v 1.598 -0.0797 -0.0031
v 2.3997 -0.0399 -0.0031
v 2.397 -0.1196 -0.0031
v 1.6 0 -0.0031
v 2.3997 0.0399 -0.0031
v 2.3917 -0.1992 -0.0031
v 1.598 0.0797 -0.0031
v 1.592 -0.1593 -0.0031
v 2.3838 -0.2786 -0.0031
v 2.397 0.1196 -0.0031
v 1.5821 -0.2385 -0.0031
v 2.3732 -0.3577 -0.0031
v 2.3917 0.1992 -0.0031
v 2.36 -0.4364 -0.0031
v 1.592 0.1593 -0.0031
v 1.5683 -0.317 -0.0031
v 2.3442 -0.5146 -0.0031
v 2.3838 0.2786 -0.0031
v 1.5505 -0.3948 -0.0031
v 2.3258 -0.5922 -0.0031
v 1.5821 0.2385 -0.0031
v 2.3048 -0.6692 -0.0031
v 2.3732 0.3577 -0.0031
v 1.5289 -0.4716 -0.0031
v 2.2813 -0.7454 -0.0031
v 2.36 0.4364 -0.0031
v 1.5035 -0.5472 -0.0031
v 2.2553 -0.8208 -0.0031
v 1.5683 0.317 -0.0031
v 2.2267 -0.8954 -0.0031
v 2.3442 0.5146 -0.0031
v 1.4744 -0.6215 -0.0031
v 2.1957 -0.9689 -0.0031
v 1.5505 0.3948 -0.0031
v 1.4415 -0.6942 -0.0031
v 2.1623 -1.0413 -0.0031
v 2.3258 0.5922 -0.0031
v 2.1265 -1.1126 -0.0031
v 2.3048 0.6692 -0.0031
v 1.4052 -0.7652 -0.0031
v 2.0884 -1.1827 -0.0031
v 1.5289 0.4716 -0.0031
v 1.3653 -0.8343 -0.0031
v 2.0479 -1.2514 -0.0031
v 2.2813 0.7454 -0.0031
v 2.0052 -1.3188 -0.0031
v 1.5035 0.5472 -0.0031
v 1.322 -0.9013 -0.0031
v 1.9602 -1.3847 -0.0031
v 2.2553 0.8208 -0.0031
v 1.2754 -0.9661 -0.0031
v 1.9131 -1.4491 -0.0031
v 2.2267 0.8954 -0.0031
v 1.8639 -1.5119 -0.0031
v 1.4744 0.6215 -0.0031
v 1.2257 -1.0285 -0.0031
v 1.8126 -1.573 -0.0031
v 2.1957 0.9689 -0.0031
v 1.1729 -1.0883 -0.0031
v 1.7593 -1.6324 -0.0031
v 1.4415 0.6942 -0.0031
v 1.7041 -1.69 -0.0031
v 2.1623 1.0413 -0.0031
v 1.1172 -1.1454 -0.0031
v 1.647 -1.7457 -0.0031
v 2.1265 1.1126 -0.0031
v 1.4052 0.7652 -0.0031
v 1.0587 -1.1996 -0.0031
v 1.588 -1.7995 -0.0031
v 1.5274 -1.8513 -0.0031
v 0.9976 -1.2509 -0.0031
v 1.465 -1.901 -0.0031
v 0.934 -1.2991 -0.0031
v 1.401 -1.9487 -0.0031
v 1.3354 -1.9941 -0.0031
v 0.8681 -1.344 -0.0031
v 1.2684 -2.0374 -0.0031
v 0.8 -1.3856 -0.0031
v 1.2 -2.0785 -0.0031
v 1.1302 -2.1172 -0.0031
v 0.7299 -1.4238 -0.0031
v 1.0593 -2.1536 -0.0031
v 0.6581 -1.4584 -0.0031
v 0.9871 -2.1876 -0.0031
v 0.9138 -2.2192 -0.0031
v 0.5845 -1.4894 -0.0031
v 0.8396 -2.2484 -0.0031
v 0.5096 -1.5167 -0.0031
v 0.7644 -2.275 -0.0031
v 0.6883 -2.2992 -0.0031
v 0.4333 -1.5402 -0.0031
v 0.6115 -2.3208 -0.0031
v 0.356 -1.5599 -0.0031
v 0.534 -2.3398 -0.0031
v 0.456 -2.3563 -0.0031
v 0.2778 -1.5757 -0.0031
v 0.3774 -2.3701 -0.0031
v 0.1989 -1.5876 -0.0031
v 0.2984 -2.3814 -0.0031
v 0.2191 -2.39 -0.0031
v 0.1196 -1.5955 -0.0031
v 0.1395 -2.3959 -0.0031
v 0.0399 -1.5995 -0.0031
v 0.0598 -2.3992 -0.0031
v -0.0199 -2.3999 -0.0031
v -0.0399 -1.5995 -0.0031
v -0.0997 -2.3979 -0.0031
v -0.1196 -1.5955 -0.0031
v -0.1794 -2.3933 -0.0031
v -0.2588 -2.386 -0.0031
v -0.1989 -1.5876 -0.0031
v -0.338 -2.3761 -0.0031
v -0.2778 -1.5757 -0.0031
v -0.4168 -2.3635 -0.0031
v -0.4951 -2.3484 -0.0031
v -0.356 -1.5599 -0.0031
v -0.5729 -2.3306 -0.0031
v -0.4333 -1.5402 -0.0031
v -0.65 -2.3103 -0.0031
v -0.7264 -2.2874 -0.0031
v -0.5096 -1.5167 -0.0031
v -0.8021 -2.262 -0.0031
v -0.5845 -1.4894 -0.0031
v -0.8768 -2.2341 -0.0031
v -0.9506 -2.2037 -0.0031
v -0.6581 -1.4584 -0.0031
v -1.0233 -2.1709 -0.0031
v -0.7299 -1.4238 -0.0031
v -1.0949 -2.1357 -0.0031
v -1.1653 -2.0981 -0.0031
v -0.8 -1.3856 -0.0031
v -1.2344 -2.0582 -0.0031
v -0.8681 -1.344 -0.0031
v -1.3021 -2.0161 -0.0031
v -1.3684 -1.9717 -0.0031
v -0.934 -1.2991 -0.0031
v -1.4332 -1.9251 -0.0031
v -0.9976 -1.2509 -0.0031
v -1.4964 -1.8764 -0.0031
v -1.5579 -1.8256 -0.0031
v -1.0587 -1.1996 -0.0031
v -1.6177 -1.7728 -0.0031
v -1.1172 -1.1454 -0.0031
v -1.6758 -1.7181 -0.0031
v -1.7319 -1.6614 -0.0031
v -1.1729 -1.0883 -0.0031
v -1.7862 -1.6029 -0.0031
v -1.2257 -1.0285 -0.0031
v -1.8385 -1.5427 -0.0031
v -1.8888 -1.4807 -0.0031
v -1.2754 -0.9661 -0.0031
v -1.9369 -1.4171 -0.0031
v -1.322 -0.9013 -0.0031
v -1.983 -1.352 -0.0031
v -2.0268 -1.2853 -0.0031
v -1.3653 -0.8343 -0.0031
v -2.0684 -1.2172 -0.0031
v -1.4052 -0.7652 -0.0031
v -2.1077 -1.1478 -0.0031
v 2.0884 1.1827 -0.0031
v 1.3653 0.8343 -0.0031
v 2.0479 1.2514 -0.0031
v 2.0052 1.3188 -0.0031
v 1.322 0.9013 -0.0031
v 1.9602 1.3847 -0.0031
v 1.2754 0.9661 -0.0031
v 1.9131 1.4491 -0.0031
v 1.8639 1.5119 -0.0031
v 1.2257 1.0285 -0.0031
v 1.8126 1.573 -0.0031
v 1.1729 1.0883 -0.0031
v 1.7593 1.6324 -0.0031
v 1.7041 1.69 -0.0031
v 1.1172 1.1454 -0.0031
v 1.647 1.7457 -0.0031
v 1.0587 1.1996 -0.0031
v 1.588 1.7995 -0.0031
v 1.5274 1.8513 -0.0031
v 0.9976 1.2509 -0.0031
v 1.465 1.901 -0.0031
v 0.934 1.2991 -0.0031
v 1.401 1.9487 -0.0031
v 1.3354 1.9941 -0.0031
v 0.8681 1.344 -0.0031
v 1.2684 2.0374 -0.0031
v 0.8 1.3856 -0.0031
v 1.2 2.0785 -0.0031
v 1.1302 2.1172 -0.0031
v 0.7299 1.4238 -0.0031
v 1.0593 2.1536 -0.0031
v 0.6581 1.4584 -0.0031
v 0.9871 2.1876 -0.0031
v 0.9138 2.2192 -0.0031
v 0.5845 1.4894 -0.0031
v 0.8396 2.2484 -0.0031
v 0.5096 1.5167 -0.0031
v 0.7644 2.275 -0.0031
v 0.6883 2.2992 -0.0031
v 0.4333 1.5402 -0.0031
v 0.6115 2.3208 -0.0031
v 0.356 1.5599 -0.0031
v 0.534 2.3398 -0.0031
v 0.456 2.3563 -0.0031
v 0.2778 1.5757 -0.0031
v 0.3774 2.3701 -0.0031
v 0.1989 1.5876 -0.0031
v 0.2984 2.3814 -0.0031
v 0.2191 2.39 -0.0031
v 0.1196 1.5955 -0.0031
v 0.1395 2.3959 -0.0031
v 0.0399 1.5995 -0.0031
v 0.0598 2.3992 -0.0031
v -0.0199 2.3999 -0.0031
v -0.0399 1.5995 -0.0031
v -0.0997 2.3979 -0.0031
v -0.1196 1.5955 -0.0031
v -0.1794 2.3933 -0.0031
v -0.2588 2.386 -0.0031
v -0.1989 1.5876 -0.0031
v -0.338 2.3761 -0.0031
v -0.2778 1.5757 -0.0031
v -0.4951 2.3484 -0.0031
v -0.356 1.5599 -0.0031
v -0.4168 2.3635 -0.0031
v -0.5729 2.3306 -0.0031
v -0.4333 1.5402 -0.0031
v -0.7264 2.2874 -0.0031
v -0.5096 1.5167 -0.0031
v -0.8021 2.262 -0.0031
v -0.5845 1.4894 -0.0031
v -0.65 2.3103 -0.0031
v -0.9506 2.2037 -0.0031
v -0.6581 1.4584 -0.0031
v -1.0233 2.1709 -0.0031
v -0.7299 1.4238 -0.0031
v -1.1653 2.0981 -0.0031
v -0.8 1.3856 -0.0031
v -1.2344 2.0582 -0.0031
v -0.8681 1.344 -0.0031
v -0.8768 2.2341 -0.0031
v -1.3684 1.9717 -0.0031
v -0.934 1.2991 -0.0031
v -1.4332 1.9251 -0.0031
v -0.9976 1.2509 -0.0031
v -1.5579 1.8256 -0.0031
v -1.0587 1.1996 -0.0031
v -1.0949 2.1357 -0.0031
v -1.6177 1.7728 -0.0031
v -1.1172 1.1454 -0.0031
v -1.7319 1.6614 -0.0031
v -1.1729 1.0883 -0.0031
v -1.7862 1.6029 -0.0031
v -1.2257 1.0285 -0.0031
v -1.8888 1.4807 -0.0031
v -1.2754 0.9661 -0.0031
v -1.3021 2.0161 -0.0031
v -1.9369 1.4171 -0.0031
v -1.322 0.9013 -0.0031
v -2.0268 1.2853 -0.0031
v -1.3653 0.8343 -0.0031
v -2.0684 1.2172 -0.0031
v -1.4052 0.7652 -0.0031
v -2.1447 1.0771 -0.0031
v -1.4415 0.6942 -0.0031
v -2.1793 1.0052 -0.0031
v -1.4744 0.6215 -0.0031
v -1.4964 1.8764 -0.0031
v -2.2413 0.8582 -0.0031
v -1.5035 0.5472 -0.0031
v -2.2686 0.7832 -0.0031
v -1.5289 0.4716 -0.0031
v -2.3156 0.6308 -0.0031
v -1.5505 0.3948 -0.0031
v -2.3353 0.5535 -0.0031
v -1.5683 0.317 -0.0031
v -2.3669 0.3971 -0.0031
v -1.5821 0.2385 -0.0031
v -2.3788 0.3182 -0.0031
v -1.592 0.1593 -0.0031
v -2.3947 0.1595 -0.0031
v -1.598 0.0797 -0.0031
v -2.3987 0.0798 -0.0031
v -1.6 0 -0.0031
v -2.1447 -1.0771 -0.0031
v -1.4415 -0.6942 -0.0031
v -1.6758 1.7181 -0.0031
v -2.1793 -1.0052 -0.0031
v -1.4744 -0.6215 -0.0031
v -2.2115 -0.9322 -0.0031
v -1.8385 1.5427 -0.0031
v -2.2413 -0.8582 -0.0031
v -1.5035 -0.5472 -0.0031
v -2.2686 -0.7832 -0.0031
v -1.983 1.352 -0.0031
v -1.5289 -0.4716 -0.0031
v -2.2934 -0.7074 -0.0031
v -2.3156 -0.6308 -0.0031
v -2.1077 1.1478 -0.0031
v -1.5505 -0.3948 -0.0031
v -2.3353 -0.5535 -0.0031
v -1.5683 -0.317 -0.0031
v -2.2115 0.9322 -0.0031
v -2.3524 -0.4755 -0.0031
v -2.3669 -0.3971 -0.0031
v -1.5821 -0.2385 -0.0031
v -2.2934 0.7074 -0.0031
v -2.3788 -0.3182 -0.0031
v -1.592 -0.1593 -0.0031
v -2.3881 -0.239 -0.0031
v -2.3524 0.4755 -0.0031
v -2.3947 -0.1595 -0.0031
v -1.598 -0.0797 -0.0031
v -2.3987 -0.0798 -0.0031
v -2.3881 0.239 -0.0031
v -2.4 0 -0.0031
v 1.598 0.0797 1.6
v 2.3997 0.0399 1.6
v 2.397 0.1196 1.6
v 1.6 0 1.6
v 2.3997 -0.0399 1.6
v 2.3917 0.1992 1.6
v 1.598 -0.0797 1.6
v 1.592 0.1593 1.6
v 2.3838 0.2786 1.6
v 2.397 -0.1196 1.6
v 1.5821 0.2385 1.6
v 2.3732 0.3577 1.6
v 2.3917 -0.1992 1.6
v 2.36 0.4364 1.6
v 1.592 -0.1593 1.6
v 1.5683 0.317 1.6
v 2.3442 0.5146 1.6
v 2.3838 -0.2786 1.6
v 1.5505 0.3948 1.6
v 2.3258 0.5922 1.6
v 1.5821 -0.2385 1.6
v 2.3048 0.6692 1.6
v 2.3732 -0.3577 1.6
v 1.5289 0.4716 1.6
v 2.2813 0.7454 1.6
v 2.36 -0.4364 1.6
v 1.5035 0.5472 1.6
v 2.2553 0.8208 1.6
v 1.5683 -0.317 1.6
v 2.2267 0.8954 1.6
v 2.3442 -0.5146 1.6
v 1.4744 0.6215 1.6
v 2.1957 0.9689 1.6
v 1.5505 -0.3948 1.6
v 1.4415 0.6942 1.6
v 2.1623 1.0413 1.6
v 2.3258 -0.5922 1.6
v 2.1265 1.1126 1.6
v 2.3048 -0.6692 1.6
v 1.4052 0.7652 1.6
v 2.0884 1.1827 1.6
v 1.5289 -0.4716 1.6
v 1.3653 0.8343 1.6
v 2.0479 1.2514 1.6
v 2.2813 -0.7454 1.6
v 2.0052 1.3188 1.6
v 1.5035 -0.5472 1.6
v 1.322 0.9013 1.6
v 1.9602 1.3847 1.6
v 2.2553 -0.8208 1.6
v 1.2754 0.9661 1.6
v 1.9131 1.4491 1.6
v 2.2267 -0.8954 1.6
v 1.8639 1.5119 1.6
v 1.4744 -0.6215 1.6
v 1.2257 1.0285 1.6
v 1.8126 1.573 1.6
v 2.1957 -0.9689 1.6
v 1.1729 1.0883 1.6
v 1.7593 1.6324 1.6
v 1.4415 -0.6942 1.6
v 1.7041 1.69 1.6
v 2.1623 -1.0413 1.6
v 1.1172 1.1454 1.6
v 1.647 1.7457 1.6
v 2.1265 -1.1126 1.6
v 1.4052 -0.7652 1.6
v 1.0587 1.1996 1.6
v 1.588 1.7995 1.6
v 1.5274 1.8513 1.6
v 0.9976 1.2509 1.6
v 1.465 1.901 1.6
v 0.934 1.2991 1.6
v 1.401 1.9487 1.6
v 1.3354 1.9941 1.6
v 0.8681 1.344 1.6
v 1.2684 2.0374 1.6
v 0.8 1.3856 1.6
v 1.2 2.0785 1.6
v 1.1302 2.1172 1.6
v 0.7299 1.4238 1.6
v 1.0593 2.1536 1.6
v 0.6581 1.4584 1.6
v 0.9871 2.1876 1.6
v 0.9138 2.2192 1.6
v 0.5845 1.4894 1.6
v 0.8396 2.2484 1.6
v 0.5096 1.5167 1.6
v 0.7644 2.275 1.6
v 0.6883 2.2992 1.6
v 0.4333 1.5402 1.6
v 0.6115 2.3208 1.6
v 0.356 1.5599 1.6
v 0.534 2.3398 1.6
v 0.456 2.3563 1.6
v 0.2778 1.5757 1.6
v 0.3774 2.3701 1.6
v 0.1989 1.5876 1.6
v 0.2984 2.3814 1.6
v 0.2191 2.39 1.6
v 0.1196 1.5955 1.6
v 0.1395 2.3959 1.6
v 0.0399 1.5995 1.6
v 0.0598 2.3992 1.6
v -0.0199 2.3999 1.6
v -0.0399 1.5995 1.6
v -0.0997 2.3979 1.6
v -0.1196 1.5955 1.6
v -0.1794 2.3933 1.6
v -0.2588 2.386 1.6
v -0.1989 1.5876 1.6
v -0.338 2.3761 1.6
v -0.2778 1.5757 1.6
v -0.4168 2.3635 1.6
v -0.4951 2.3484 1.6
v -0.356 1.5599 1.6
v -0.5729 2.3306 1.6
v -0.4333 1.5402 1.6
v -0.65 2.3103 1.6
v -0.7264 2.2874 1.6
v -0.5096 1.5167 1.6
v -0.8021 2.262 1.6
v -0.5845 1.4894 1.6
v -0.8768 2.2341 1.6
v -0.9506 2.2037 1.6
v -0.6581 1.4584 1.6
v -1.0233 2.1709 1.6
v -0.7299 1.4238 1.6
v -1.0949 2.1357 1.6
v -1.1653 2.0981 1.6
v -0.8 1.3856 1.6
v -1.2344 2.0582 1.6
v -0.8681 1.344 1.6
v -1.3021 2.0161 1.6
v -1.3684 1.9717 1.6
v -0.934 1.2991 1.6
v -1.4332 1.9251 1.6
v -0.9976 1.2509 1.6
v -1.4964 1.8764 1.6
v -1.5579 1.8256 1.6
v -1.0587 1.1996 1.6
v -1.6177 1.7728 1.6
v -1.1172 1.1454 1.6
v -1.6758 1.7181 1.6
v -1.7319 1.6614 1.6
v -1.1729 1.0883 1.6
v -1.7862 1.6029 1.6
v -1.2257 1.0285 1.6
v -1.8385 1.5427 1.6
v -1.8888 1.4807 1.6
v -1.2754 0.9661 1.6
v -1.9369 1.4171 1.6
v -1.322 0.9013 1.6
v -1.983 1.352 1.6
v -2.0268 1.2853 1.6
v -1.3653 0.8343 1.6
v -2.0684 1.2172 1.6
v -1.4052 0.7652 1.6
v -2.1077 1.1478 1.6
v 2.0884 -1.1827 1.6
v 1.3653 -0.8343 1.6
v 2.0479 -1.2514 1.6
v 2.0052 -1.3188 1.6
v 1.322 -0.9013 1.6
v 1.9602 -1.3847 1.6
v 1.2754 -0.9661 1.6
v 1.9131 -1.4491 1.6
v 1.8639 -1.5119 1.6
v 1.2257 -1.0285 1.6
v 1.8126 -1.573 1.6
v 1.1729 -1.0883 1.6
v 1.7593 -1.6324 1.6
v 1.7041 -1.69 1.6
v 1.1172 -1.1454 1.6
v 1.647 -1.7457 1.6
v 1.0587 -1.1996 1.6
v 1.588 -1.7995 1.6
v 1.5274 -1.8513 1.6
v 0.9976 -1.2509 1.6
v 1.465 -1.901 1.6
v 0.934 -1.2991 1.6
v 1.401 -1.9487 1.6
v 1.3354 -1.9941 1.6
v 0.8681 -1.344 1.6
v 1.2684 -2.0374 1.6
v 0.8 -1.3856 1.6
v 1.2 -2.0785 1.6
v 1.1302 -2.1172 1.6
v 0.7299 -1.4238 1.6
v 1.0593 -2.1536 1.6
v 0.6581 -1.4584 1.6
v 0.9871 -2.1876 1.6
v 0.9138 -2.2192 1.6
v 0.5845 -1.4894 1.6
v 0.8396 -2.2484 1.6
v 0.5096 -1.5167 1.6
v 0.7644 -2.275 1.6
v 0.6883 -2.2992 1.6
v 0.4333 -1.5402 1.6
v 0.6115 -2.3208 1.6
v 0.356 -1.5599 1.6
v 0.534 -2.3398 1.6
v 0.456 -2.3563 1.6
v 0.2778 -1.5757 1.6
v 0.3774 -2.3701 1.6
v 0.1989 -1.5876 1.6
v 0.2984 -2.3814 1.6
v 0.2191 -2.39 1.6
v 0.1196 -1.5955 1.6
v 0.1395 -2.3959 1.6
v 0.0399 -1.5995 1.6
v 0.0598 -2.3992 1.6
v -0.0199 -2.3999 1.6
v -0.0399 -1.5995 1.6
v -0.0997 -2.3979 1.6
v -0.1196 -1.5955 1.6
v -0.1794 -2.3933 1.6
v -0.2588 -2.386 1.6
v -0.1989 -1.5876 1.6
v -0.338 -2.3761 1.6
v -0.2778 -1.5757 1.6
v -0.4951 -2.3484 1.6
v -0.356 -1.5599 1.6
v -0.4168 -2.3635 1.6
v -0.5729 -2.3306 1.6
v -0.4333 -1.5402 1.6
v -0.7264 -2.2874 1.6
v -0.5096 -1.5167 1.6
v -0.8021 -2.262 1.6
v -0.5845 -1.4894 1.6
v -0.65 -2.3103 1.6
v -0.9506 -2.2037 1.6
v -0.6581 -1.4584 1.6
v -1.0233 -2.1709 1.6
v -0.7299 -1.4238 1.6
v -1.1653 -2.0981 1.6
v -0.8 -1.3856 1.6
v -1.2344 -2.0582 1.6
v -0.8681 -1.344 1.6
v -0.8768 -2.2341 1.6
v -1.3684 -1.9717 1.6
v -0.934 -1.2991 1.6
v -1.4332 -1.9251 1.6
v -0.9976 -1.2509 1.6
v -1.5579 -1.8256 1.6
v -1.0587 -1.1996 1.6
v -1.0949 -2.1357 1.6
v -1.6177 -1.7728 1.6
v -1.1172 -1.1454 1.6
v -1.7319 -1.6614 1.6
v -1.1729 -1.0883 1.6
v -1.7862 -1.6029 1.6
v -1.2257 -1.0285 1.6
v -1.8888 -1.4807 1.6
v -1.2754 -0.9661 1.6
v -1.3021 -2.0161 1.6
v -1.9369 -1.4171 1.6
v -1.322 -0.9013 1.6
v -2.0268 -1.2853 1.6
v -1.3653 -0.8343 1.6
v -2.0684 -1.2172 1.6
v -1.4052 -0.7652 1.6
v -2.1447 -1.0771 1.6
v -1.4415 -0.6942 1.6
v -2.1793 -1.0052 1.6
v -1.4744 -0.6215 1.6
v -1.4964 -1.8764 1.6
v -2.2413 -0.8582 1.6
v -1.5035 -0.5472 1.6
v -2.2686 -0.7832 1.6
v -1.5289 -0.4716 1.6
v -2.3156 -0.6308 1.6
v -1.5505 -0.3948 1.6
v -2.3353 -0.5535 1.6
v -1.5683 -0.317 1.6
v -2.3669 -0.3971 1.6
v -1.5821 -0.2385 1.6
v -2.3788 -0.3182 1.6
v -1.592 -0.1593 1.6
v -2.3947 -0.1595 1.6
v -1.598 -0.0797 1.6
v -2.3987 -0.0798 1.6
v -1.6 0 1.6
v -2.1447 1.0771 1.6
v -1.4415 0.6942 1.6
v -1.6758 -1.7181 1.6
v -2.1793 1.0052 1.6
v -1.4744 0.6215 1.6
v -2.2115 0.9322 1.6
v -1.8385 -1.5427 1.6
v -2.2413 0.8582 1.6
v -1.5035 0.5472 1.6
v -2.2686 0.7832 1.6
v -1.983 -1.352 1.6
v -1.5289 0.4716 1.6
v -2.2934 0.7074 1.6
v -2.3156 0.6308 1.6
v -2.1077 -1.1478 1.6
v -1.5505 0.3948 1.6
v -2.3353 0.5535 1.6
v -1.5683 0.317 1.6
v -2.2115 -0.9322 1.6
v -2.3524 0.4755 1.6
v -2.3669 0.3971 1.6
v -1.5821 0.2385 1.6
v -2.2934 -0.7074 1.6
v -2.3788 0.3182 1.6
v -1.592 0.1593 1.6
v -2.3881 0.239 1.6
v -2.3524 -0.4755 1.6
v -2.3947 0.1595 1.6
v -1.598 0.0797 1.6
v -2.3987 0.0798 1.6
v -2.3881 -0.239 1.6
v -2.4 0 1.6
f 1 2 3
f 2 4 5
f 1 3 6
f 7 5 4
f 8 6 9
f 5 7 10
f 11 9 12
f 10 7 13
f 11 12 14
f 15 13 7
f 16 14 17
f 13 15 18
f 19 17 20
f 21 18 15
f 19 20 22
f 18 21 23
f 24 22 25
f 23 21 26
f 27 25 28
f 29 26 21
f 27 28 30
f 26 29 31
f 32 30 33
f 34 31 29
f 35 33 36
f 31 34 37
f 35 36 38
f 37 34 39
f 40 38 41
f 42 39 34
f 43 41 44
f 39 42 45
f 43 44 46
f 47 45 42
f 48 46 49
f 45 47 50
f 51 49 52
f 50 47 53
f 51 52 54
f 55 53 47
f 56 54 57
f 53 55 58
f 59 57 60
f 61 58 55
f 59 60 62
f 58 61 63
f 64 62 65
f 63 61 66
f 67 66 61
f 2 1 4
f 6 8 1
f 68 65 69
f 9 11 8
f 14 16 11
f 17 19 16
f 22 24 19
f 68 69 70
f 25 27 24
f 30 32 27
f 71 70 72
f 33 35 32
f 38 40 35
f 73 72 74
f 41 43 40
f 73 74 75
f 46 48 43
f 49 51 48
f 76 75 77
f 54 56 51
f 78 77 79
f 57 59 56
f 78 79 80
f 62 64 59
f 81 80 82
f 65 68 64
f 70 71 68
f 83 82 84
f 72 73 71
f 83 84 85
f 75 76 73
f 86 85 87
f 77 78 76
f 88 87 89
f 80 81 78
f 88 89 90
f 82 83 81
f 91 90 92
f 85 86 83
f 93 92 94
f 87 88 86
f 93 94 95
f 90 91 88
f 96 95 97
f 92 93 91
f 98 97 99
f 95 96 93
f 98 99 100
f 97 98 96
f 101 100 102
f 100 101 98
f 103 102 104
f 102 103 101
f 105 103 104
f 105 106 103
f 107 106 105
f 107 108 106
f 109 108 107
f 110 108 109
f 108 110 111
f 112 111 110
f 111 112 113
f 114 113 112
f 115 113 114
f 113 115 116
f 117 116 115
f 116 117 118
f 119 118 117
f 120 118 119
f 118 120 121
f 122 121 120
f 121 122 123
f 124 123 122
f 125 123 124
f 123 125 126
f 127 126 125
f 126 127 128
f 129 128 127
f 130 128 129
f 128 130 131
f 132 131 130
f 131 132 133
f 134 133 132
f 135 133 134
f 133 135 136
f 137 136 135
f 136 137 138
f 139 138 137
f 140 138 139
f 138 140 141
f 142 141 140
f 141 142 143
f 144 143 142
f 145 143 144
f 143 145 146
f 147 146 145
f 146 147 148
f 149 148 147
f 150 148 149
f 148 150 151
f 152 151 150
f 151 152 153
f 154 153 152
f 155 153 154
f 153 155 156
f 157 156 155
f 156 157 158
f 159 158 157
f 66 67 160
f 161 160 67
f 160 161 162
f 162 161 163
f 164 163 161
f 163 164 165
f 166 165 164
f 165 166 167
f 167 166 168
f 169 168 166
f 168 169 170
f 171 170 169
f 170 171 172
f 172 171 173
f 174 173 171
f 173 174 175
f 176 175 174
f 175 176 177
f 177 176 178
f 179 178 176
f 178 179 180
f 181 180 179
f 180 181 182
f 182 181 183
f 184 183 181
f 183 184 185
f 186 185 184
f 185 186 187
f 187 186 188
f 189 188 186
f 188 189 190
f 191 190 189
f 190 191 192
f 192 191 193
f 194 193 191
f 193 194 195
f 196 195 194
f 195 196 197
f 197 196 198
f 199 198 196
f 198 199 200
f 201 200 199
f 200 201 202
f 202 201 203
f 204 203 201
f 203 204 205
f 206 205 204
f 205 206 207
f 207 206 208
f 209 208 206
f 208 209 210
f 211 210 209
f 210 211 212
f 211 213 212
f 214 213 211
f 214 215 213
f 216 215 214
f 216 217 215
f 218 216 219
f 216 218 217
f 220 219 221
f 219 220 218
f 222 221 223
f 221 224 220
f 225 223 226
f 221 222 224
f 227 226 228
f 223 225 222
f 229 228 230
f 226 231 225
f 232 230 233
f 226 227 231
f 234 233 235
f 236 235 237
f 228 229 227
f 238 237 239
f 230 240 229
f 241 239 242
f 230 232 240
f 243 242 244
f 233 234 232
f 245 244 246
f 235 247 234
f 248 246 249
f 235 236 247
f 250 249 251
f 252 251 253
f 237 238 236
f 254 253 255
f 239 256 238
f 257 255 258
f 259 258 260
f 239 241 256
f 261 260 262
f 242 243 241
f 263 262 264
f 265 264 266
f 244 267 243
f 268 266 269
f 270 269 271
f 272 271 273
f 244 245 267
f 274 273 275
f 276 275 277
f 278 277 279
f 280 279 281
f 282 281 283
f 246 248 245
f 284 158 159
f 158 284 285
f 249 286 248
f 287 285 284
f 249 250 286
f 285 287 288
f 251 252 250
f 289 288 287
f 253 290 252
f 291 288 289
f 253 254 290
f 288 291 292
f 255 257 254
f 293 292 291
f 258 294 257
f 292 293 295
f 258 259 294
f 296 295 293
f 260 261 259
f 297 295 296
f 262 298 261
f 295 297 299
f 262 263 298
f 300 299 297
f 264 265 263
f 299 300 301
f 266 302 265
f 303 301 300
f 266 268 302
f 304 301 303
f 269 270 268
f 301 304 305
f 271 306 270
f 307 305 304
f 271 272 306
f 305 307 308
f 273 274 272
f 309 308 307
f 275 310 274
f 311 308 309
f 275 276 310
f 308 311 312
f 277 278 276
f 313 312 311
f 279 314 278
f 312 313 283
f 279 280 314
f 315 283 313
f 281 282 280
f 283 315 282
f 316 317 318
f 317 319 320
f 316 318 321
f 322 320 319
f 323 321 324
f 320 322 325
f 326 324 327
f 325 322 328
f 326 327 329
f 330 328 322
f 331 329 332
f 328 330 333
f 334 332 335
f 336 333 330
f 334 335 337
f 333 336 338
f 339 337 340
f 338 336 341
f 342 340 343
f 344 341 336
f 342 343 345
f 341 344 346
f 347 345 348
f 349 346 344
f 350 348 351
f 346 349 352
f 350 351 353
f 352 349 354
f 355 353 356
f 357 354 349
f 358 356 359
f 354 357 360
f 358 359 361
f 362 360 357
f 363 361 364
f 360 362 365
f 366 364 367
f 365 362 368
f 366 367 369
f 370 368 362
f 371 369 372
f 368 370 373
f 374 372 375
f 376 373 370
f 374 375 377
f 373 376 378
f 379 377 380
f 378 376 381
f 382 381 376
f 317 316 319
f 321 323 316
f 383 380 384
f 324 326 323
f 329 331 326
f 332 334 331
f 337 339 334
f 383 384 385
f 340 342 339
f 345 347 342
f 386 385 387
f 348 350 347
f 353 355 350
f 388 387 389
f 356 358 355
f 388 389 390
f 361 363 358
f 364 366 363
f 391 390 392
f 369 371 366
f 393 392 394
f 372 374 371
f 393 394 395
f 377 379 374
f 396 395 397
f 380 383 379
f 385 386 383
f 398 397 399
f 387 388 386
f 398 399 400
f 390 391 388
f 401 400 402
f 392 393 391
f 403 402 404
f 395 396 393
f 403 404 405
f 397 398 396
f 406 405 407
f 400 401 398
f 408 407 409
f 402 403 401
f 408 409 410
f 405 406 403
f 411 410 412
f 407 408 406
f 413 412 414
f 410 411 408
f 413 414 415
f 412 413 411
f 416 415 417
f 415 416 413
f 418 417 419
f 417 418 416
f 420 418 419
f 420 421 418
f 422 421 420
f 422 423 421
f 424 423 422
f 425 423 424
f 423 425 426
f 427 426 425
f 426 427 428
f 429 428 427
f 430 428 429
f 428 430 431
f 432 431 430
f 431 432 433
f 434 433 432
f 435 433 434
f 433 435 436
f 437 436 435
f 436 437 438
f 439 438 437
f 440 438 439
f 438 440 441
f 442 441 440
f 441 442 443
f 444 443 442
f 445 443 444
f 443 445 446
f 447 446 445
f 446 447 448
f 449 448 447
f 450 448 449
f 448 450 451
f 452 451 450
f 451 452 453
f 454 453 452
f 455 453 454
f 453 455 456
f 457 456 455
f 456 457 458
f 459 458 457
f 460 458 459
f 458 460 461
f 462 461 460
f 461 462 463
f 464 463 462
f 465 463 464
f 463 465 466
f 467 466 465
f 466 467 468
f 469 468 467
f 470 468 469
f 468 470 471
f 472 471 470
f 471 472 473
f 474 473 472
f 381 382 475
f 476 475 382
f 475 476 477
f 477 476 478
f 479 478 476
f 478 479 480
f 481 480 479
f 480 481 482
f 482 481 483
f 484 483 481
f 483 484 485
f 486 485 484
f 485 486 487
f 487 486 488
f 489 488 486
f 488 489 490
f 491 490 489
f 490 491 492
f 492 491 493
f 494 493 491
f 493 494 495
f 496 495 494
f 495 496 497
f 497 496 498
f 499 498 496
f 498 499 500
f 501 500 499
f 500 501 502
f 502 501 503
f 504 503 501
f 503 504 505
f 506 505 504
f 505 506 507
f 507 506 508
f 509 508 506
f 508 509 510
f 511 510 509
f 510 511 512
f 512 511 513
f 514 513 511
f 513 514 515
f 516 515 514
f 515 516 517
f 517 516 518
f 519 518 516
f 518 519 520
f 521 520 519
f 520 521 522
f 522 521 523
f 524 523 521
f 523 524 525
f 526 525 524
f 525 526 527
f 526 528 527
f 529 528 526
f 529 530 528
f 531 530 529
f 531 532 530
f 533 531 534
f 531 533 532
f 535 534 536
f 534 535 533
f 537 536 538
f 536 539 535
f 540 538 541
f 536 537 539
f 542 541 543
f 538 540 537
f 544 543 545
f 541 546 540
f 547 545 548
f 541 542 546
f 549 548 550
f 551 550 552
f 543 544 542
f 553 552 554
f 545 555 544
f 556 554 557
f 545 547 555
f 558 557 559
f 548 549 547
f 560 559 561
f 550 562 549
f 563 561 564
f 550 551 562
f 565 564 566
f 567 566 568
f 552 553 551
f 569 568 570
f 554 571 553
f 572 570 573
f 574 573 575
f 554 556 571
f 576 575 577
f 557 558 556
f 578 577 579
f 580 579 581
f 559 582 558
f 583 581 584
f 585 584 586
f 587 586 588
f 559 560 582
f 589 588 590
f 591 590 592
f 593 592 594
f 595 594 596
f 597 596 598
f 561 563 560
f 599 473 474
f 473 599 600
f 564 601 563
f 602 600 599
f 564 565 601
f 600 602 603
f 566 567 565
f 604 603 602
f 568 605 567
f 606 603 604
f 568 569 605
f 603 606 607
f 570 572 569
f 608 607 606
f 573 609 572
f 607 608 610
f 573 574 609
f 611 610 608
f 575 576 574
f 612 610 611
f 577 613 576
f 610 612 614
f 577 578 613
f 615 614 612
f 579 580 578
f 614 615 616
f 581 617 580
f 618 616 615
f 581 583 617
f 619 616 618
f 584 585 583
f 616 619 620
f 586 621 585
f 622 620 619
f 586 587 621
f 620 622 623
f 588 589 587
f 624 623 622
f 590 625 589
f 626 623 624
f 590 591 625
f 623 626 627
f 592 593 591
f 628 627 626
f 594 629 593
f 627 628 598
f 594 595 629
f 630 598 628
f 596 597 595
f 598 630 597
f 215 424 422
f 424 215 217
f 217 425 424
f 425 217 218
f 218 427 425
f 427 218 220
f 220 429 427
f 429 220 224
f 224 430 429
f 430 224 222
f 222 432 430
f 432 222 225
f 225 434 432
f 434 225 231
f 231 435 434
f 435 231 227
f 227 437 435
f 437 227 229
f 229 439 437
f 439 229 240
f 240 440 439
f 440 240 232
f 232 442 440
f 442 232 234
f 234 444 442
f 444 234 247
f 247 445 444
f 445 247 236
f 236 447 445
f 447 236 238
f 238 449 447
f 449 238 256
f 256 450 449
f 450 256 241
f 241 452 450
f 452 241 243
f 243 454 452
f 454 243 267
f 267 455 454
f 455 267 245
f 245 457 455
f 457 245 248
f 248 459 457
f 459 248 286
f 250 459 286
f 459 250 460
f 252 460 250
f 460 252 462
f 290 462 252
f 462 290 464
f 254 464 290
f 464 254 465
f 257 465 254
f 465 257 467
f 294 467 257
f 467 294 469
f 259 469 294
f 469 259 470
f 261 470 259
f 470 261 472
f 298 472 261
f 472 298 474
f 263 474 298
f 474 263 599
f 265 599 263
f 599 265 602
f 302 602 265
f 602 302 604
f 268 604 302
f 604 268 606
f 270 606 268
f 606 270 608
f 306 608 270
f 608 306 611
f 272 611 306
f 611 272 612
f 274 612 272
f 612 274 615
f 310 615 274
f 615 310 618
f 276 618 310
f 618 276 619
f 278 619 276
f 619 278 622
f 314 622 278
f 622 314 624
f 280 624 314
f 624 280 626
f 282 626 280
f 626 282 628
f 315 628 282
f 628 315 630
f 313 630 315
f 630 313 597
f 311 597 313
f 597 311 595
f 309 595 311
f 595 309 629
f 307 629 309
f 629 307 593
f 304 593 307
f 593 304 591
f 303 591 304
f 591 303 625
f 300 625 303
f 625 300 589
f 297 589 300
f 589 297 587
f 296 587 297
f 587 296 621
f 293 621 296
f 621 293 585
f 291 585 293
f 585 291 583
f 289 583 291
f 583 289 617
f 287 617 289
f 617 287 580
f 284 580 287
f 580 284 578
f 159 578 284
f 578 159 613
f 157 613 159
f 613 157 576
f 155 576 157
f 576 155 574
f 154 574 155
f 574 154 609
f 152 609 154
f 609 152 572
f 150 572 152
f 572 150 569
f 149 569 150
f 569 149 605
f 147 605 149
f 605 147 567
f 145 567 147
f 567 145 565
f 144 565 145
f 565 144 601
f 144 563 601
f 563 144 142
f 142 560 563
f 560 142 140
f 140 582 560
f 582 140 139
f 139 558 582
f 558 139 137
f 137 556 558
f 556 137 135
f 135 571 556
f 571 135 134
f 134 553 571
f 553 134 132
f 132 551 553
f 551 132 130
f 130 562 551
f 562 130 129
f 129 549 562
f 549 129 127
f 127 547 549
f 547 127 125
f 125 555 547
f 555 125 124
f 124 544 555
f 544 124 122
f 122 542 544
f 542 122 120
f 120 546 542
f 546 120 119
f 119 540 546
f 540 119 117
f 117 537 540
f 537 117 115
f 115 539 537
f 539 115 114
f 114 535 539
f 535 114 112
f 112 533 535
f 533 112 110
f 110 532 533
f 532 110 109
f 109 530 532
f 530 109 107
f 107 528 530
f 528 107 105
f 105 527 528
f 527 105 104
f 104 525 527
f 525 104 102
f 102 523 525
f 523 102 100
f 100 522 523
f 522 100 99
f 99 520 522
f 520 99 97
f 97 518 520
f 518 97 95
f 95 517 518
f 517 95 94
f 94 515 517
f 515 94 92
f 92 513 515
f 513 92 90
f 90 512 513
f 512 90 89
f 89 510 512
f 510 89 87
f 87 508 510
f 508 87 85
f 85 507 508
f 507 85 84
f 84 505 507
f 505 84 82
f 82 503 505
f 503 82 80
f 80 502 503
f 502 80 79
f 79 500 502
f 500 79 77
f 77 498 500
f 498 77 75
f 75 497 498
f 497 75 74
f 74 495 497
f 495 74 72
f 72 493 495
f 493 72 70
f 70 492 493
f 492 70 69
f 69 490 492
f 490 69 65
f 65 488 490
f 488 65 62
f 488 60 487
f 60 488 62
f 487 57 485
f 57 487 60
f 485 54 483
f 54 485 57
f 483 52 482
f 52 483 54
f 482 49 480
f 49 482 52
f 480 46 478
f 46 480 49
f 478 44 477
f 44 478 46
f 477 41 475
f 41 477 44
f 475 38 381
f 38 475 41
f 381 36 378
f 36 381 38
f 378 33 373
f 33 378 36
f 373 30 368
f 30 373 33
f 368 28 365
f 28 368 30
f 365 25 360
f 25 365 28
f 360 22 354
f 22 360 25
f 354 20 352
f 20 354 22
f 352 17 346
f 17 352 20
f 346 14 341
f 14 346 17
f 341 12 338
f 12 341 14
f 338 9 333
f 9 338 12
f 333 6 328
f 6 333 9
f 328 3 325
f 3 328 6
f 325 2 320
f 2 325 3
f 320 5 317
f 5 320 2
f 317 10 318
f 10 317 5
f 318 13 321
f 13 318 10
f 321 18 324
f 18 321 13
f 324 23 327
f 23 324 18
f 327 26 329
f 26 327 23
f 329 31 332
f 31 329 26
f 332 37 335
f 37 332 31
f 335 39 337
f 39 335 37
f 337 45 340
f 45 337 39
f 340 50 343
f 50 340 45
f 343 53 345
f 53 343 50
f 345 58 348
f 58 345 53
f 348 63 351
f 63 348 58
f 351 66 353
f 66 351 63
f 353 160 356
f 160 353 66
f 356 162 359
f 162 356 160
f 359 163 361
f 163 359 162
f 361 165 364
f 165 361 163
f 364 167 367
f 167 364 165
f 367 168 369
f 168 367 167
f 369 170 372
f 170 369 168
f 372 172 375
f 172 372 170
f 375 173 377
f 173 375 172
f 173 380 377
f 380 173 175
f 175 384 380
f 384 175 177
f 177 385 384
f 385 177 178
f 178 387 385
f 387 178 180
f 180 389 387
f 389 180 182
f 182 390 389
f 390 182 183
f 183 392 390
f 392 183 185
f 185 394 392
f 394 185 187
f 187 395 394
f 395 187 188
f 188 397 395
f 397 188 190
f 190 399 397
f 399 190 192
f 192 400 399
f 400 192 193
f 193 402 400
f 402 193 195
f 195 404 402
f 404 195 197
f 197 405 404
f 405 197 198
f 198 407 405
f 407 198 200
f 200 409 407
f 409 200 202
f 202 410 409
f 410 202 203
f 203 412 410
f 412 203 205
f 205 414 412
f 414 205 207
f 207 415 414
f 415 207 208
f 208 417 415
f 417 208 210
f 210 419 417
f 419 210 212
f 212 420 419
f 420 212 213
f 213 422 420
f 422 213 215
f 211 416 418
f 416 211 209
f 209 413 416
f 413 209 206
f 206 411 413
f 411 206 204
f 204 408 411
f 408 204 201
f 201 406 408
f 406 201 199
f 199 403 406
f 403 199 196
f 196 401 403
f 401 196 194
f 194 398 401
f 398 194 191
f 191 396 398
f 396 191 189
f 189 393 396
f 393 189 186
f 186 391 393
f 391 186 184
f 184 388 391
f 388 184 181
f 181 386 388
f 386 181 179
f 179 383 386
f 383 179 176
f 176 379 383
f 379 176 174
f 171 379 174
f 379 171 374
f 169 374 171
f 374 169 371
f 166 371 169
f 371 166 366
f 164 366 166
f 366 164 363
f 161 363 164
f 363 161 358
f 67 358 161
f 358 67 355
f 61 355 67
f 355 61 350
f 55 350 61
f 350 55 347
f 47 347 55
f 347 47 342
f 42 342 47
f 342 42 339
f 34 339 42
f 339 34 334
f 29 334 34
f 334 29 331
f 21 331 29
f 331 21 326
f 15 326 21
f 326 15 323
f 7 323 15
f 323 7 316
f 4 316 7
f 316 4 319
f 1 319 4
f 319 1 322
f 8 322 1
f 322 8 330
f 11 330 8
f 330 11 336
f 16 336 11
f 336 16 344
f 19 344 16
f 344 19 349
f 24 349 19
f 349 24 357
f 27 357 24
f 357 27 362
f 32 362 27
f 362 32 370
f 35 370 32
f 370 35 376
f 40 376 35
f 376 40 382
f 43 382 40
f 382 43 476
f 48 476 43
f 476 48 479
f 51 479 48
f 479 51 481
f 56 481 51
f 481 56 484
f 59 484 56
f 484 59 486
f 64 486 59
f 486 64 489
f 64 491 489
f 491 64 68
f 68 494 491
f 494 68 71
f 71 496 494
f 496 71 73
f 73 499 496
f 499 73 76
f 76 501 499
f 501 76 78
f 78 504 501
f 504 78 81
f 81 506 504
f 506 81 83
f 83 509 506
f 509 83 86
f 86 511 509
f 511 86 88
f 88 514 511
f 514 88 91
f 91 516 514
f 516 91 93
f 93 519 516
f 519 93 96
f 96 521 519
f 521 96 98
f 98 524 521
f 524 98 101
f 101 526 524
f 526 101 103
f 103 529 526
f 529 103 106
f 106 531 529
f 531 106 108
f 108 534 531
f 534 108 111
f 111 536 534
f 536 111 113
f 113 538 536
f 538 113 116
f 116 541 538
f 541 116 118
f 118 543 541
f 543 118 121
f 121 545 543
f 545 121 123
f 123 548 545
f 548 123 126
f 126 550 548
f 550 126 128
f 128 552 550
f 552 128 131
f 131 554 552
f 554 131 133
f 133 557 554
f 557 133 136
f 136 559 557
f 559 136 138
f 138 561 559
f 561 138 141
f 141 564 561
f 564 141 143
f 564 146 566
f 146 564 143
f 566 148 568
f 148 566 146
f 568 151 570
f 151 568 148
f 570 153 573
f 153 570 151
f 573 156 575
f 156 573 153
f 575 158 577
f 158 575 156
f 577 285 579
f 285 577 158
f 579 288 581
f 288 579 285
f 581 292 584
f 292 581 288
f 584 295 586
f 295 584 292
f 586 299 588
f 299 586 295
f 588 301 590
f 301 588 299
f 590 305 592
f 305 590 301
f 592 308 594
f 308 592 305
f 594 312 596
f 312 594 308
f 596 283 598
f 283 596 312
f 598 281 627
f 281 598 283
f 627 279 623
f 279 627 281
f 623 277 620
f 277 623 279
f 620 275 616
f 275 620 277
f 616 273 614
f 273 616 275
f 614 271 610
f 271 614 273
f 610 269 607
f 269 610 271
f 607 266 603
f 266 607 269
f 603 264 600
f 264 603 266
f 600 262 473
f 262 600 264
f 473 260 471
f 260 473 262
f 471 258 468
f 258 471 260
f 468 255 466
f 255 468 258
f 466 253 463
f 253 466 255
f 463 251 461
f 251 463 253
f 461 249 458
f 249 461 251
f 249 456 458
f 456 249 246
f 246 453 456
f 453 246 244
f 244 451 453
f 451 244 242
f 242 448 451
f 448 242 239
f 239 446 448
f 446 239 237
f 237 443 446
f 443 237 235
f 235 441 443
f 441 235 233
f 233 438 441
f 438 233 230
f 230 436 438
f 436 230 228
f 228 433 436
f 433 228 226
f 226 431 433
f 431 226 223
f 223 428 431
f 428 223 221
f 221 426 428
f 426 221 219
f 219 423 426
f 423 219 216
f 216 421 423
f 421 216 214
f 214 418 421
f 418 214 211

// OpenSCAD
use <../lib.scad>
use <3626cp87.scad>
$fa=1; $fs=0.2;
function ldraw_lib__46506(realsolid=false) = [
// 0 =Minifig Head Glasses, Thin Brown Eyebrows, Smile Pattern (Hollow Stud)
// 0 Name: 46506.dat
// 0 Author: Howard Lande [HowardLande]
// 0 !LDRAW_ORG Part Alias UPDATE 2017-01
// 0 !LICENSE Licensed under CC BY 2.0 and CC BY 4.0 : see CAreadme.txt
// 
// 0 BFC CERTIFY CCW
  [0,"BFC","CERTIFY"],
  [0,"BFC","CCW"],
// 
// 0 !HISTORY 2017-12-30 [PTadmin] Official Update 2017-01
// 
// 
// 1 16 0 0 0 1 0 0 0 1 0 0 0 1 3626cp87.dat
  [1,16,0,0,0,1,0,0,0,1,0,0,0,1, ldraw_lib__3626cp87(realsolid)],
];
module ldraw_lib__46506(step=0, col=false, unit=2/5, alt=false, line=0.2, solid=!$preview)
    makepoly(ldraw_lib__46506(solid), step=step, col=col, unit=unit, alt=alt, line=line, solid=solid);
ldraw_lib__46506(line=0.2);
